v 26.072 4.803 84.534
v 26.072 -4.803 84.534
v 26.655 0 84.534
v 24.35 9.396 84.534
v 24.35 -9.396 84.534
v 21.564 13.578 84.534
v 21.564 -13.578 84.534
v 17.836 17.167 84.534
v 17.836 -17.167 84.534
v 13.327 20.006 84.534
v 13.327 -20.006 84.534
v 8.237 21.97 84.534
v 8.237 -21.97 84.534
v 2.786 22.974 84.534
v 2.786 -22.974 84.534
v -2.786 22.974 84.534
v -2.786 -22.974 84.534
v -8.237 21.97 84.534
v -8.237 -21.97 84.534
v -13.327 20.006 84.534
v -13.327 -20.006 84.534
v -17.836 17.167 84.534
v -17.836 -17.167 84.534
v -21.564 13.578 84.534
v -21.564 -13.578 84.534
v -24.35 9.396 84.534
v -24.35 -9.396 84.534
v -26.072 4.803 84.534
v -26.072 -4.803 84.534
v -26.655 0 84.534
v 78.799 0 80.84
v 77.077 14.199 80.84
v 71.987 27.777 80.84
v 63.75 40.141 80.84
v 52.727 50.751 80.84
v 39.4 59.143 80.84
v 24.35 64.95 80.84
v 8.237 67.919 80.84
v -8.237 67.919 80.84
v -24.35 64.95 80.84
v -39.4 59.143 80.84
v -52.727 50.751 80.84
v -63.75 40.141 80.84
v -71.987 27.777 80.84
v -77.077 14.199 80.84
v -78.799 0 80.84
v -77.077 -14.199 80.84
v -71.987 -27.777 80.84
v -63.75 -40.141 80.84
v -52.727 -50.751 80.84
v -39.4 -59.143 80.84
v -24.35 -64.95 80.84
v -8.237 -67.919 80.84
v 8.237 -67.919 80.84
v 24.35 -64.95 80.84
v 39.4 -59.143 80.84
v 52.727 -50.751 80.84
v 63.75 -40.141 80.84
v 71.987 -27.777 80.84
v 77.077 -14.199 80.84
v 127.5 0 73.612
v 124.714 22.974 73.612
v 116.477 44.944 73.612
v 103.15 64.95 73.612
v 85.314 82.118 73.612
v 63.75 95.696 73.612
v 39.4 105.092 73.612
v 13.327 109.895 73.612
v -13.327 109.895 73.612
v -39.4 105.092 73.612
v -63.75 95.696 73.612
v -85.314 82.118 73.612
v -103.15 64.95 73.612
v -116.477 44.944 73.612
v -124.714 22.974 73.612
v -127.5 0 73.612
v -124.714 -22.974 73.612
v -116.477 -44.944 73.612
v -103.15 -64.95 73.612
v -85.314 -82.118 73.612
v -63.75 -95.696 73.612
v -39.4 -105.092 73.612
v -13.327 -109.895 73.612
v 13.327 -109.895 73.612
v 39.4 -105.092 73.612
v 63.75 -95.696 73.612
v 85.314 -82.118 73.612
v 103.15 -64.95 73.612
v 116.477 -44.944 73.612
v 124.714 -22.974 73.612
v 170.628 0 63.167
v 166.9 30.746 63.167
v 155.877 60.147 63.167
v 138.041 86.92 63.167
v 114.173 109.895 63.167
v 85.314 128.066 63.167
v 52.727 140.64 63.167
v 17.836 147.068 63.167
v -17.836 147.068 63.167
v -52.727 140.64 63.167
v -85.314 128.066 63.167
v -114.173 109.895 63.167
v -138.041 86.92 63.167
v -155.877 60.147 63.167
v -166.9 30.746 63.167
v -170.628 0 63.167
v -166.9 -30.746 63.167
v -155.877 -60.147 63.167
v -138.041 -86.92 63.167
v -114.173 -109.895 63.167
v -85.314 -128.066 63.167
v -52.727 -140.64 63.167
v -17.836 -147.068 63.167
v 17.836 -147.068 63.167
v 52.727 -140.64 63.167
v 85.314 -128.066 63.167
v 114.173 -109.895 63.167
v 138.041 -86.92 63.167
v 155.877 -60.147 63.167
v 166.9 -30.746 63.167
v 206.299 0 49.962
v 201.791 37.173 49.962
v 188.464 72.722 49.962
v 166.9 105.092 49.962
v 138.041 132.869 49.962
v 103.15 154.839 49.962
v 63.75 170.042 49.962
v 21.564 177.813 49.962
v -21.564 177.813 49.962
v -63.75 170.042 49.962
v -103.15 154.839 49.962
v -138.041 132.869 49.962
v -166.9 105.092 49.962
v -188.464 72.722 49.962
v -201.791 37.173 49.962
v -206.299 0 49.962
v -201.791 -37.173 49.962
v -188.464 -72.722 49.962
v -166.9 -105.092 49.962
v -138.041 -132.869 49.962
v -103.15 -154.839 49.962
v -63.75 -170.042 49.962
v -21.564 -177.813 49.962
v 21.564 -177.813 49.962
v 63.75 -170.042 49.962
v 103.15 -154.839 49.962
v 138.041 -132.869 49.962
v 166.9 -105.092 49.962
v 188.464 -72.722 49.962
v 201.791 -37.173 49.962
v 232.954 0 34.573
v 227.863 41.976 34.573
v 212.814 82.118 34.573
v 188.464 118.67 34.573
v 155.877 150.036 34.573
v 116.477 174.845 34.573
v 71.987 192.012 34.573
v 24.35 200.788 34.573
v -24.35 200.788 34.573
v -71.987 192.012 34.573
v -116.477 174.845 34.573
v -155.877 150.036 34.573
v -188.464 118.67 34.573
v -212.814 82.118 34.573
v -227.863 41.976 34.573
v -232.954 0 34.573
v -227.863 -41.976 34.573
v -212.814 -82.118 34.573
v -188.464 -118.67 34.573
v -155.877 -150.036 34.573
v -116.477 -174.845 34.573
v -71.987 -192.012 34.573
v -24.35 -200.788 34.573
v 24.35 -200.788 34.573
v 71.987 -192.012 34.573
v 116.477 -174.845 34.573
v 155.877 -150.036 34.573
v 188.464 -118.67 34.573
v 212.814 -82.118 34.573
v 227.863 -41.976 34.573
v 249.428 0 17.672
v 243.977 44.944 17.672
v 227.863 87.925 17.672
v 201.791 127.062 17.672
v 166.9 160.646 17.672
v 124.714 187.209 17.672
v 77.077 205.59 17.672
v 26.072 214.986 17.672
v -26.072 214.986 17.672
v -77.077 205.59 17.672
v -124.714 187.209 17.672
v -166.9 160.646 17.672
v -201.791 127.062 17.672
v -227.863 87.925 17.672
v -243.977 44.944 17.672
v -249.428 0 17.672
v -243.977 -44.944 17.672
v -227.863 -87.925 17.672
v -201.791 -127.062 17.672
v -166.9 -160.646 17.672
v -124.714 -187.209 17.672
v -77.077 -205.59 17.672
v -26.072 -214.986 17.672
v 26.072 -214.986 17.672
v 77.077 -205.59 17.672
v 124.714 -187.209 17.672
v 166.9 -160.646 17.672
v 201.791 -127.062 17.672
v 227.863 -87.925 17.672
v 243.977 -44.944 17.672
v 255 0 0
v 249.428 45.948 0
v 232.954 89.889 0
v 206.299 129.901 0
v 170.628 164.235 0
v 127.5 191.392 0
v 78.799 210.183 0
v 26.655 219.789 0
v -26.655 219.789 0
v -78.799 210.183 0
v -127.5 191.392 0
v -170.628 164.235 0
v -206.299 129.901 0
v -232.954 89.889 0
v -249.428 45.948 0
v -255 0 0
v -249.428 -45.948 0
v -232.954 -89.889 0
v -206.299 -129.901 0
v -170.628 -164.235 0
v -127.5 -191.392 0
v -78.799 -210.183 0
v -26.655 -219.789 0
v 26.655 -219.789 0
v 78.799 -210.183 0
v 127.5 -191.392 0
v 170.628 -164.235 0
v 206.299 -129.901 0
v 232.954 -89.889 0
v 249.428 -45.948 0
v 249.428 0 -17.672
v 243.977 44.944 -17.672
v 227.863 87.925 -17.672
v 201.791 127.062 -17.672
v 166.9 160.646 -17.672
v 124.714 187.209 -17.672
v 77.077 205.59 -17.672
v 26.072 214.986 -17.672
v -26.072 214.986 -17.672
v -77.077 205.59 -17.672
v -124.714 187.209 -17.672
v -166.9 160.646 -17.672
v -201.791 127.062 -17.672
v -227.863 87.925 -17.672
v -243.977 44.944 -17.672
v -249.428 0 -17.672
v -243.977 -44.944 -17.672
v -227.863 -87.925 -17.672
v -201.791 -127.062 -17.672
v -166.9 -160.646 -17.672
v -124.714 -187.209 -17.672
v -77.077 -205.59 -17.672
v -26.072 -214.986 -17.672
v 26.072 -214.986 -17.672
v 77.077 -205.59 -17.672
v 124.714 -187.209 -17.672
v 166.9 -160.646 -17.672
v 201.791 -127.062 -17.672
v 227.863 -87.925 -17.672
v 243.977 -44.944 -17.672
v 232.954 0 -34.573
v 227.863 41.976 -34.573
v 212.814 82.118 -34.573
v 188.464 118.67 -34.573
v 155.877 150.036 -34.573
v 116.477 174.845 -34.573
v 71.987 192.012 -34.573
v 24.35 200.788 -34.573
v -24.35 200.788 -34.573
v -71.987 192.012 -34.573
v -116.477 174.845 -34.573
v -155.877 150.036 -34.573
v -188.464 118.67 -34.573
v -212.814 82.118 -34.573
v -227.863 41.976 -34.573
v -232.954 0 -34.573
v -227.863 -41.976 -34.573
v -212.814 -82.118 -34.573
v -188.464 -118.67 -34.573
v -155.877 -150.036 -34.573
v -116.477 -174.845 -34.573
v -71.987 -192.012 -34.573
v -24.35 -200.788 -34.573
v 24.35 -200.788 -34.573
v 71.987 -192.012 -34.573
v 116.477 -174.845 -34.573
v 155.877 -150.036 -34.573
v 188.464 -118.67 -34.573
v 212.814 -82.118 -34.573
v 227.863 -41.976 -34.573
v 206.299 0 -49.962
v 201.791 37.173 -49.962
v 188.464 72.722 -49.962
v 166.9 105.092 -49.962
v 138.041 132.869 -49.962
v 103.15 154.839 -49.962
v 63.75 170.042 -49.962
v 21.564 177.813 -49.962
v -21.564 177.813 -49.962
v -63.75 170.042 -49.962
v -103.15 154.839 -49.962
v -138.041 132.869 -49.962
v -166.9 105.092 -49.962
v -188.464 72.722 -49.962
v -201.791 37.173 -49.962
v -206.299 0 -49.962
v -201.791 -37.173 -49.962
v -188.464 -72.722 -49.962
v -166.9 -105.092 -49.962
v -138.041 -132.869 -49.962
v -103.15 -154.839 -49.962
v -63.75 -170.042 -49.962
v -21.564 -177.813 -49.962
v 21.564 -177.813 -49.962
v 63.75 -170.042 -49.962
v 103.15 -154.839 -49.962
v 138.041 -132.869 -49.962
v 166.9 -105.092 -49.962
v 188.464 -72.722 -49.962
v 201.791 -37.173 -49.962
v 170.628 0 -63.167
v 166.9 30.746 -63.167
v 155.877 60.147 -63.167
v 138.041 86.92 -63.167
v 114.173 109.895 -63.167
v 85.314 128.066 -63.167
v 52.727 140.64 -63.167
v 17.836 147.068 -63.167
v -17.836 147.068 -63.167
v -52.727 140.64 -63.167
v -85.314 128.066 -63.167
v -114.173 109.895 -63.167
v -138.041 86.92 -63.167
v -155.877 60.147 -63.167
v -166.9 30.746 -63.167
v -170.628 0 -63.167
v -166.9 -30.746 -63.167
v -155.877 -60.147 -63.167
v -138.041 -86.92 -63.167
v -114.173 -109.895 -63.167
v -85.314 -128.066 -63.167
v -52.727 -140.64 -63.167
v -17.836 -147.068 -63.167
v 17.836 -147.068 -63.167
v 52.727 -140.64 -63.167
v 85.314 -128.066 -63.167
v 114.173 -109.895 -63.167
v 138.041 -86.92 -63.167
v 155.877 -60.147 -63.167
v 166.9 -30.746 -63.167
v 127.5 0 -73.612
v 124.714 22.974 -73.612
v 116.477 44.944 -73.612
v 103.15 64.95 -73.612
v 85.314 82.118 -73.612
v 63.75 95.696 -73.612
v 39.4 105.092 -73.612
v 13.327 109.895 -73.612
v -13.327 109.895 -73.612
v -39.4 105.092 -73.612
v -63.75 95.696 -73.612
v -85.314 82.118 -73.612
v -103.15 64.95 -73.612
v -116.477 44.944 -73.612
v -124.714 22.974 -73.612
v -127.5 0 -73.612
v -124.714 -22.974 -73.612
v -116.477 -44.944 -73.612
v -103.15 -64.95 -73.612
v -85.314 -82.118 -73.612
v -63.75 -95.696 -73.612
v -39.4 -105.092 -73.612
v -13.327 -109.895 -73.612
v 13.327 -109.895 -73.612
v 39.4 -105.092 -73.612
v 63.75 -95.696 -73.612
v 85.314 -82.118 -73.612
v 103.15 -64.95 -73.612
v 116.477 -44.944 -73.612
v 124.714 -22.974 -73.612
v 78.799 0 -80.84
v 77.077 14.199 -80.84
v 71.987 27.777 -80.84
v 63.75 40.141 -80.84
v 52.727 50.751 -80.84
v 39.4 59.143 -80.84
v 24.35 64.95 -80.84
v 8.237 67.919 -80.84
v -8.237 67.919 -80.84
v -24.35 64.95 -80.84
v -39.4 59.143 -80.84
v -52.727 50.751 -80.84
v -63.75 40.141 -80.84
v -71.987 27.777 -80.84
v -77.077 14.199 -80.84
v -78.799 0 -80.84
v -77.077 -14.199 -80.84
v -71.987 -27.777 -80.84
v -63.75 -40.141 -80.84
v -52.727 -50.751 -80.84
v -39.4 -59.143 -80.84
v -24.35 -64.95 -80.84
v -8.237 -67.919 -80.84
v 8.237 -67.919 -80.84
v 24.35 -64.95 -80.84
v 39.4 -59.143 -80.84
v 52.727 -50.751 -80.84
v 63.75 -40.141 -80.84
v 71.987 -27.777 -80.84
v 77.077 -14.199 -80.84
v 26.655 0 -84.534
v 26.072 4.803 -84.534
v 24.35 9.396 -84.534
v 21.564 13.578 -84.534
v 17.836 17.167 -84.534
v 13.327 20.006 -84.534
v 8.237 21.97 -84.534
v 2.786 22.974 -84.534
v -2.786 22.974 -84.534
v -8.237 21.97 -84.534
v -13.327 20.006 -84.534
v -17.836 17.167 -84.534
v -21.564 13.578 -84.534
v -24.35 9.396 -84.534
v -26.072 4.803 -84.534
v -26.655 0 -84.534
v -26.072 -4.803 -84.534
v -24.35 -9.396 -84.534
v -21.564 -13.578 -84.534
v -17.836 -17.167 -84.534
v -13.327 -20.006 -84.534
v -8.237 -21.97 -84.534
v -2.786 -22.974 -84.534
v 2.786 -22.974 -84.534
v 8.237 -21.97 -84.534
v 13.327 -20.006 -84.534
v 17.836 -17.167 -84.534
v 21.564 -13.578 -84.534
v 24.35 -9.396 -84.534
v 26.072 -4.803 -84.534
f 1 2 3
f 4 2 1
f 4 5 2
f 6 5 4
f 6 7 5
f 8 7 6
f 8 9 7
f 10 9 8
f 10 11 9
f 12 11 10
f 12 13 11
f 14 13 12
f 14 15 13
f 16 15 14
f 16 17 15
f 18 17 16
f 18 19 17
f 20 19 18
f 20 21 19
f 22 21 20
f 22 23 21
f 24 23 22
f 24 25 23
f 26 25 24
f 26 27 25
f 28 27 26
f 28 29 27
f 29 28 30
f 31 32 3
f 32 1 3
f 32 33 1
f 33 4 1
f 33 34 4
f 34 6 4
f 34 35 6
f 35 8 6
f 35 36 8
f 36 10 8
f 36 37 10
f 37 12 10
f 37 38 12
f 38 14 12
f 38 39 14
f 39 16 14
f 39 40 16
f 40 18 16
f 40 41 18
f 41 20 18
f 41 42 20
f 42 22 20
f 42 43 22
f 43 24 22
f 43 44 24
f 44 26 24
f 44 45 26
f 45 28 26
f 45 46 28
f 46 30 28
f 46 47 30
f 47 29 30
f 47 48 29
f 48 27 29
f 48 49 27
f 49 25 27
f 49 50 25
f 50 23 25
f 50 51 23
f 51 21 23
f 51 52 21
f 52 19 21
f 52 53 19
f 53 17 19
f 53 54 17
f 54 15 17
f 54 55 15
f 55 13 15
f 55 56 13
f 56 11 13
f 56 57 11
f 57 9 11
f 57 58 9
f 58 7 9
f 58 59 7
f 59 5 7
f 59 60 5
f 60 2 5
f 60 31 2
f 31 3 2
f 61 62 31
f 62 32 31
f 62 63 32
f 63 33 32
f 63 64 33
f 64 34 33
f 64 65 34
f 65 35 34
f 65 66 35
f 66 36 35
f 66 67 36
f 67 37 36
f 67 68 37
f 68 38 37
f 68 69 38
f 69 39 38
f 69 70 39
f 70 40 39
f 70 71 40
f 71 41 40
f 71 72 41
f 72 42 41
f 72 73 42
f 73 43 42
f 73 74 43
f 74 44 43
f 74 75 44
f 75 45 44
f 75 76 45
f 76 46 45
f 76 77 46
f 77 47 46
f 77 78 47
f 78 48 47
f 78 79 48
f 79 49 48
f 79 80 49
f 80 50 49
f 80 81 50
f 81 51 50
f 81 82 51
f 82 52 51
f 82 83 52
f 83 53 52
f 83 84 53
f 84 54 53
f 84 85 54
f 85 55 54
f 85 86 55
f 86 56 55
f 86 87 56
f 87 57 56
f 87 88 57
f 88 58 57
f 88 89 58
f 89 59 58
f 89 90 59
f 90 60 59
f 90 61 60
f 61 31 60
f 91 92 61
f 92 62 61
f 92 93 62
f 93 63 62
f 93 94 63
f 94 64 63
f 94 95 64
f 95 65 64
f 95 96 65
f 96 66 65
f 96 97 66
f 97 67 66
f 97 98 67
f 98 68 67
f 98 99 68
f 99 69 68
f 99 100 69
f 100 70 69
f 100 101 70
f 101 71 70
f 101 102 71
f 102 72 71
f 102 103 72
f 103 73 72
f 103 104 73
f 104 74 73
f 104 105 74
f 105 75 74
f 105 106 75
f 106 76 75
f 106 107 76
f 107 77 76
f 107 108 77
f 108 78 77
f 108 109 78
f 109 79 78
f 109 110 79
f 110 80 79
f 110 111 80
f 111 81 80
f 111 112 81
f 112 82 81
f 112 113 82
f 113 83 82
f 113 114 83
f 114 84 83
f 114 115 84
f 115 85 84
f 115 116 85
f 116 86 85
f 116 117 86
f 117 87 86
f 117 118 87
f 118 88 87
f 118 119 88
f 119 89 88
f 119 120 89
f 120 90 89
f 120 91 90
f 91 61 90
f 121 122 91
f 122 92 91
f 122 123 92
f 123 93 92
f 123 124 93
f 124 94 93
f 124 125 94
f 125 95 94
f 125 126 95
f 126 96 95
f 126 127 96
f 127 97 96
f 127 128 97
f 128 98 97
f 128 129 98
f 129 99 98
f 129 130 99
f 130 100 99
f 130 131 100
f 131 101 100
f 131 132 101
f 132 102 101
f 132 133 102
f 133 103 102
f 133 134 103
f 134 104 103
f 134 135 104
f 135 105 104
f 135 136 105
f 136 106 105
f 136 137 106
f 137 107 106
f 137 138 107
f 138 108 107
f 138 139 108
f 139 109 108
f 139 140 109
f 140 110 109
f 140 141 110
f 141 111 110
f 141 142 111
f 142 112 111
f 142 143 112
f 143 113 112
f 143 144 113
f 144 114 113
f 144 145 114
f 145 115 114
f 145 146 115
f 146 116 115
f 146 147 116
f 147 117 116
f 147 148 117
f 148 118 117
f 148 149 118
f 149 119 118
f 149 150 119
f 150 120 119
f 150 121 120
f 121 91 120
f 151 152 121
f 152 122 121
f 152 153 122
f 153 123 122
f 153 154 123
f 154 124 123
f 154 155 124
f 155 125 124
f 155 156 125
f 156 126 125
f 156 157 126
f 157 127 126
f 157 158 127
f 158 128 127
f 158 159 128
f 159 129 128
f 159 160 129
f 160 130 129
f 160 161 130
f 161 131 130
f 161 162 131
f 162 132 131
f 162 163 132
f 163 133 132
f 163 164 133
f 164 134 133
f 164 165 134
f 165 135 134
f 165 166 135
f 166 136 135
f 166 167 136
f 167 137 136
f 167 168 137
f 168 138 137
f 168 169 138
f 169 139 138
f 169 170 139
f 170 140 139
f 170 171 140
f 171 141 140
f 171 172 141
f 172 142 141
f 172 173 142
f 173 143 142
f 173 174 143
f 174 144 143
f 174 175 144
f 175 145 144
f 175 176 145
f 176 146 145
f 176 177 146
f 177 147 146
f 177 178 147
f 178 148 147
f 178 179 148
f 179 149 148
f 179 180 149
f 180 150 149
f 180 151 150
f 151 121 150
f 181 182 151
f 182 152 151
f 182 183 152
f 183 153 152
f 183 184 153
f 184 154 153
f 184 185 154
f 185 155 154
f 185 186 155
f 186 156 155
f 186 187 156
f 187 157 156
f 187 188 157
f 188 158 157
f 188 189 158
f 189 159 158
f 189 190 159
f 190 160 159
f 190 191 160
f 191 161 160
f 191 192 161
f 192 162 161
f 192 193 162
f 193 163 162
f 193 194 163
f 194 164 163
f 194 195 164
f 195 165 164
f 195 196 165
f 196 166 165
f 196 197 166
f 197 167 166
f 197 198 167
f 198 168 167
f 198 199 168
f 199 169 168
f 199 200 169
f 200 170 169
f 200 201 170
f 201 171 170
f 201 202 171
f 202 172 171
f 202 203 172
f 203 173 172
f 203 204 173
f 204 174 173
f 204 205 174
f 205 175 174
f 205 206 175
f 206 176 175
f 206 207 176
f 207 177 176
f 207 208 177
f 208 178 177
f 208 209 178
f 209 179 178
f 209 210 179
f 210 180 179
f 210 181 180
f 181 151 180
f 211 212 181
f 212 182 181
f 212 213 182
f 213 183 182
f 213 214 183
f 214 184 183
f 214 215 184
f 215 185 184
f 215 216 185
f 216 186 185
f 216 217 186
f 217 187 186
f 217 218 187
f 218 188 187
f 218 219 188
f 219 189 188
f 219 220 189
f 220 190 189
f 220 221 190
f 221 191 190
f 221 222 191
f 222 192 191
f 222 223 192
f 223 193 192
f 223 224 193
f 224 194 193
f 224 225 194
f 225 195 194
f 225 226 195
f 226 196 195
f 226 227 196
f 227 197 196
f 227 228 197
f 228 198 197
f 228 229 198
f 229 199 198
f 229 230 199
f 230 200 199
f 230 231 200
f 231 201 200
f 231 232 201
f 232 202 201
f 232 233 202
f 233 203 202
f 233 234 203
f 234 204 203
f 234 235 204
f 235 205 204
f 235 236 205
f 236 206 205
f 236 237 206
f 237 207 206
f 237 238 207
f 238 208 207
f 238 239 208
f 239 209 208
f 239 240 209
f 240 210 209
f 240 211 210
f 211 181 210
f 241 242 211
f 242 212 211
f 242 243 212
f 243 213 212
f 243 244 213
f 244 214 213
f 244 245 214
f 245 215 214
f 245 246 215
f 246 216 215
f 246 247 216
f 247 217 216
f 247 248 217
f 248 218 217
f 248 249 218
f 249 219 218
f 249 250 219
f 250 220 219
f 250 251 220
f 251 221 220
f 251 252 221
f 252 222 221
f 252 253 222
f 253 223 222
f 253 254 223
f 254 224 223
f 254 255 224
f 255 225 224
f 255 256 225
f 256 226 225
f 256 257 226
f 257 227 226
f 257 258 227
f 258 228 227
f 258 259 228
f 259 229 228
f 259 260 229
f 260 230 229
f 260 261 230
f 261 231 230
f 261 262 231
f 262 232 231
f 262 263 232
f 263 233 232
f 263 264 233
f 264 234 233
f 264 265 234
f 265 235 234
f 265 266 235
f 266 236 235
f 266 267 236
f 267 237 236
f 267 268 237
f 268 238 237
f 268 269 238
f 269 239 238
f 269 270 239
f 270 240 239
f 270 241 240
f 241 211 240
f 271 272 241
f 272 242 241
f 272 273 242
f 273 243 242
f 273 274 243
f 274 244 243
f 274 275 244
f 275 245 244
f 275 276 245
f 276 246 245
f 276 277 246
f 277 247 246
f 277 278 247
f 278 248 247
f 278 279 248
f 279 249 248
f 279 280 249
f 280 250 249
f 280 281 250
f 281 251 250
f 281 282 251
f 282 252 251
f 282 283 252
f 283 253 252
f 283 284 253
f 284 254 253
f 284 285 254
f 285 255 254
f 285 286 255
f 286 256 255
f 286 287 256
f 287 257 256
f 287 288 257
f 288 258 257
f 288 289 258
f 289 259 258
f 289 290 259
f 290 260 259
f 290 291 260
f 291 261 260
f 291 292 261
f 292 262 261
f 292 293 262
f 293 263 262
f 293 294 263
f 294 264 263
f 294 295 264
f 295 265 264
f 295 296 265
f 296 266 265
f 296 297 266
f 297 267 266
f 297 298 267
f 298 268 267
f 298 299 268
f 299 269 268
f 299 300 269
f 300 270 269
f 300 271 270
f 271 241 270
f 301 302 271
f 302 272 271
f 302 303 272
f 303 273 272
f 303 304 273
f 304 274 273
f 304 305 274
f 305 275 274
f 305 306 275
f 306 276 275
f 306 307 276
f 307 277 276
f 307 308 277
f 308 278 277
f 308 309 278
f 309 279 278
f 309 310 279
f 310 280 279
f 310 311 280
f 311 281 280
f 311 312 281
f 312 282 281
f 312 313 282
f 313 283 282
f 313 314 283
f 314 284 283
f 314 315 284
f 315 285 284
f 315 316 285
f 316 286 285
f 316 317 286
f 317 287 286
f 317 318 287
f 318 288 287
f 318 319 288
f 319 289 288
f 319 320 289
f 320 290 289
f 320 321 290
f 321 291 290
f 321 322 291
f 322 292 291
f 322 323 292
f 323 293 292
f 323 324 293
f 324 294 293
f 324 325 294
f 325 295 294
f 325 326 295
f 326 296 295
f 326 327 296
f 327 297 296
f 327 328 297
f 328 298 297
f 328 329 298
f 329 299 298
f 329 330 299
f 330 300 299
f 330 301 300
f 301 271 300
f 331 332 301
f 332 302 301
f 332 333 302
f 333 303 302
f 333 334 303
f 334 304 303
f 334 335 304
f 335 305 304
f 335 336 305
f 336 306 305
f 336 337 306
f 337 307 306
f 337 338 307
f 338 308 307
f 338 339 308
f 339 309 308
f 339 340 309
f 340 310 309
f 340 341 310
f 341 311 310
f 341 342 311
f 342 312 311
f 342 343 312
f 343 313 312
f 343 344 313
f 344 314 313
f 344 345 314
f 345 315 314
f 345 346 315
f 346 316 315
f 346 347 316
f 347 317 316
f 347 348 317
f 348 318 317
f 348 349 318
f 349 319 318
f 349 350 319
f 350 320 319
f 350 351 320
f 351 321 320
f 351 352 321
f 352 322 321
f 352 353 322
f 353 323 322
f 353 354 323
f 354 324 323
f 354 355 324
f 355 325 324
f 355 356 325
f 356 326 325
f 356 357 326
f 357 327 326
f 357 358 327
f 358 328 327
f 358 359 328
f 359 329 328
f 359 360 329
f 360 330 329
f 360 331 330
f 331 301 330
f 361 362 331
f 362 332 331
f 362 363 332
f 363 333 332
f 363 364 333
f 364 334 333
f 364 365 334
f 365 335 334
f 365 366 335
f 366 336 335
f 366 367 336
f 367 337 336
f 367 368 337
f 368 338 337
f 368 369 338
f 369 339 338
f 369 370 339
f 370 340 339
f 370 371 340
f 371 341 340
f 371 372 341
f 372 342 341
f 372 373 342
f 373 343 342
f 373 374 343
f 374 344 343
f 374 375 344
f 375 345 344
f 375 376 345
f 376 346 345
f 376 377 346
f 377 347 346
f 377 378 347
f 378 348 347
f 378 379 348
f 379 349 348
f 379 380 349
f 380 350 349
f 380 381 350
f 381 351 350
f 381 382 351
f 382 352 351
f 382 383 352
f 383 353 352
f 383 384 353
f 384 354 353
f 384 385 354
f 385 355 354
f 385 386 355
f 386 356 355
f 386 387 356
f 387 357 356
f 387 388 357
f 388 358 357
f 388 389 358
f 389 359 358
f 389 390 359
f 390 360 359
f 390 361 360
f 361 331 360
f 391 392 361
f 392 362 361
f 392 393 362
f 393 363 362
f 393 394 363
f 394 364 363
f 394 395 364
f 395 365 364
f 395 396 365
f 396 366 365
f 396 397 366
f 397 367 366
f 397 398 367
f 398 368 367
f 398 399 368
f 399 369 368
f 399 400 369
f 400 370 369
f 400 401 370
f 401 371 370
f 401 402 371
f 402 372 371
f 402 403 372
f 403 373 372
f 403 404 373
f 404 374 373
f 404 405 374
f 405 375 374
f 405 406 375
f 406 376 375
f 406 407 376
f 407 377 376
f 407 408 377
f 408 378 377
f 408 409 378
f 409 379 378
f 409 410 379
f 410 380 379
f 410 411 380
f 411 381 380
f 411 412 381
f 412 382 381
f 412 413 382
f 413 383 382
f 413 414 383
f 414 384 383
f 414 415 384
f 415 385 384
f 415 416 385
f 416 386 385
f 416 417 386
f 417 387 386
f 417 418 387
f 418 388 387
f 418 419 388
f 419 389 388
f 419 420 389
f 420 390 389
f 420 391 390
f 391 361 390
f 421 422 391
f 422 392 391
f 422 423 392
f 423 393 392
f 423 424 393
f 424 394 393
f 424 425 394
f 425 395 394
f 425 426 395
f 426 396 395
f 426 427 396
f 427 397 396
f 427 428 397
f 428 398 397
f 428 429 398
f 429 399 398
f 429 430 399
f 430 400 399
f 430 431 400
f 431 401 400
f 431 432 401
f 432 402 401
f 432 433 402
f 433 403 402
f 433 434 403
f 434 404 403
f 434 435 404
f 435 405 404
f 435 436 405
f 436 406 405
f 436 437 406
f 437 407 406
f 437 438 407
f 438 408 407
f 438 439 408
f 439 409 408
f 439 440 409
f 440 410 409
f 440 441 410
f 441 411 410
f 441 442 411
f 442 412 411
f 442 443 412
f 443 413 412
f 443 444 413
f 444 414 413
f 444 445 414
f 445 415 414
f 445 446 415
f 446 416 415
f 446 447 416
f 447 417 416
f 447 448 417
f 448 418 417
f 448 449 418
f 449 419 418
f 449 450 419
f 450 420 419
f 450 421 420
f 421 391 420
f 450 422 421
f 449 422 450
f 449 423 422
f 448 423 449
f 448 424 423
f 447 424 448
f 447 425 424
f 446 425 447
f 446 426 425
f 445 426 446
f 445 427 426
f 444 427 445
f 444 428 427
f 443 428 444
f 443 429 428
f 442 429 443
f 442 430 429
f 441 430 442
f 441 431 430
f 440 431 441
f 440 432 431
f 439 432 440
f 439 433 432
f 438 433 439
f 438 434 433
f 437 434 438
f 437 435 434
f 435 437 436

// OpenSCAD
// Generated by SolidPython 1.0.1 on 2020-07-29 00:46:52


scale(v = [15, 13, 5]) {
	sphere(r = 17);
}
/***********************************************
*********      SolidPython code:      **********
************************************************
 
# import packages: SolidPython
from solid import *
from solid.utils import *
from itertools import chain, combinations, permutations


class Resize:

    def __init__(self, scad_file):
        self.scad_file = scad_file
        #self.scad_file = import_scad(scad_file)
        # cone/cylinder param:
        self.r1 = 0
        self.r2 = 0
        self.h = 0
        # rectangular prism param:
        self.w = 0
        self.l = 0
        # ellipse param:
        self.r = 0

    # import OpenScad code (file name corresponds to shape)


    # classify shape + parameters
    def assign(self, param1, param2, param3):
        if self.scad_file == 'cone.scad':
            self.r1 = param1
            self.r2 = param2
            self.h = param3
        elif self.scad_file == 'cylinder.scad':
            self.r1 = param1
            self.r2 = param2
            self.h = param3
        elif self.scad_file == 'rectangularPrism.scad':
            self.h = param1
            self.l = param2
            self.w = param3
        else:
            self.r = param1
            self.h = param2

    # resize parameters
    def iterate(self):
        x = range(3, 20, 2)
        i = 1
        if self.scad_file == 'cone.scad':
            tempList = list(permutations(x, 2))
            for temp in tempList:
                param1 = temp[0]
                param2 = temp[1]
                filepath = 'produced_scad_files/' + 'cone' + str(param1) + '_' + str(param2) + '_' + '.scad'
                scad_render_to_file(cylinder(h=param1, r1=param2, r2=0), filepath)

        elif self.scad_file == 'cylinder.scad':
            tempList = list(permutations(x, 3))
            for temp in tempList:
                param1 = temp[0]
                param2 = temp[1]
                filepath = 'produced_scad_files/' + 'cylinder' + str(param1) + '_' + str(param2) + '_' + '.scad'
                scad_render_to_file(cylinder(h=param1, r1=param2, r2=param2), filepath)

        elif self.scad_file == 'rectangularPrism.scad':
            tempList = list(permutations(x, 3))
            for temp in tempList:
                param1 = temp[0]
                param2 = temp[1]
                param3 = temp[2]
                filepath = 'produced_scad_files/' + 'rectangularPrism' + str(param1) + '_' + str(param2) + '_' + str(
                    param3) + '.scad'
                scad_render_to_file(cube(size=(param1, param2, param3)), filepath)

        elif self.scad_file == 'ellipse.scad':
            tempList = list(permutations(x, 4))
            for temp in tempList:
                param1 = temp[0]
                param2 = temp[1]
                param3 = temp[2]
                param4 = temp[3]
                filepath = 'produced_scad_files/' + 'ellipse' + str(param1) + '_' + str(param2) + '_' + str(param3) + '_' + str(param4) + '.scad'
                scad_render_to_file(scale([param1, param2, param3])(sphere(r=param4)), filepath)

    def render_to_scadfile(self):
        scad_render_to_file(scad, 'example.scad') 
 
************************************************/
